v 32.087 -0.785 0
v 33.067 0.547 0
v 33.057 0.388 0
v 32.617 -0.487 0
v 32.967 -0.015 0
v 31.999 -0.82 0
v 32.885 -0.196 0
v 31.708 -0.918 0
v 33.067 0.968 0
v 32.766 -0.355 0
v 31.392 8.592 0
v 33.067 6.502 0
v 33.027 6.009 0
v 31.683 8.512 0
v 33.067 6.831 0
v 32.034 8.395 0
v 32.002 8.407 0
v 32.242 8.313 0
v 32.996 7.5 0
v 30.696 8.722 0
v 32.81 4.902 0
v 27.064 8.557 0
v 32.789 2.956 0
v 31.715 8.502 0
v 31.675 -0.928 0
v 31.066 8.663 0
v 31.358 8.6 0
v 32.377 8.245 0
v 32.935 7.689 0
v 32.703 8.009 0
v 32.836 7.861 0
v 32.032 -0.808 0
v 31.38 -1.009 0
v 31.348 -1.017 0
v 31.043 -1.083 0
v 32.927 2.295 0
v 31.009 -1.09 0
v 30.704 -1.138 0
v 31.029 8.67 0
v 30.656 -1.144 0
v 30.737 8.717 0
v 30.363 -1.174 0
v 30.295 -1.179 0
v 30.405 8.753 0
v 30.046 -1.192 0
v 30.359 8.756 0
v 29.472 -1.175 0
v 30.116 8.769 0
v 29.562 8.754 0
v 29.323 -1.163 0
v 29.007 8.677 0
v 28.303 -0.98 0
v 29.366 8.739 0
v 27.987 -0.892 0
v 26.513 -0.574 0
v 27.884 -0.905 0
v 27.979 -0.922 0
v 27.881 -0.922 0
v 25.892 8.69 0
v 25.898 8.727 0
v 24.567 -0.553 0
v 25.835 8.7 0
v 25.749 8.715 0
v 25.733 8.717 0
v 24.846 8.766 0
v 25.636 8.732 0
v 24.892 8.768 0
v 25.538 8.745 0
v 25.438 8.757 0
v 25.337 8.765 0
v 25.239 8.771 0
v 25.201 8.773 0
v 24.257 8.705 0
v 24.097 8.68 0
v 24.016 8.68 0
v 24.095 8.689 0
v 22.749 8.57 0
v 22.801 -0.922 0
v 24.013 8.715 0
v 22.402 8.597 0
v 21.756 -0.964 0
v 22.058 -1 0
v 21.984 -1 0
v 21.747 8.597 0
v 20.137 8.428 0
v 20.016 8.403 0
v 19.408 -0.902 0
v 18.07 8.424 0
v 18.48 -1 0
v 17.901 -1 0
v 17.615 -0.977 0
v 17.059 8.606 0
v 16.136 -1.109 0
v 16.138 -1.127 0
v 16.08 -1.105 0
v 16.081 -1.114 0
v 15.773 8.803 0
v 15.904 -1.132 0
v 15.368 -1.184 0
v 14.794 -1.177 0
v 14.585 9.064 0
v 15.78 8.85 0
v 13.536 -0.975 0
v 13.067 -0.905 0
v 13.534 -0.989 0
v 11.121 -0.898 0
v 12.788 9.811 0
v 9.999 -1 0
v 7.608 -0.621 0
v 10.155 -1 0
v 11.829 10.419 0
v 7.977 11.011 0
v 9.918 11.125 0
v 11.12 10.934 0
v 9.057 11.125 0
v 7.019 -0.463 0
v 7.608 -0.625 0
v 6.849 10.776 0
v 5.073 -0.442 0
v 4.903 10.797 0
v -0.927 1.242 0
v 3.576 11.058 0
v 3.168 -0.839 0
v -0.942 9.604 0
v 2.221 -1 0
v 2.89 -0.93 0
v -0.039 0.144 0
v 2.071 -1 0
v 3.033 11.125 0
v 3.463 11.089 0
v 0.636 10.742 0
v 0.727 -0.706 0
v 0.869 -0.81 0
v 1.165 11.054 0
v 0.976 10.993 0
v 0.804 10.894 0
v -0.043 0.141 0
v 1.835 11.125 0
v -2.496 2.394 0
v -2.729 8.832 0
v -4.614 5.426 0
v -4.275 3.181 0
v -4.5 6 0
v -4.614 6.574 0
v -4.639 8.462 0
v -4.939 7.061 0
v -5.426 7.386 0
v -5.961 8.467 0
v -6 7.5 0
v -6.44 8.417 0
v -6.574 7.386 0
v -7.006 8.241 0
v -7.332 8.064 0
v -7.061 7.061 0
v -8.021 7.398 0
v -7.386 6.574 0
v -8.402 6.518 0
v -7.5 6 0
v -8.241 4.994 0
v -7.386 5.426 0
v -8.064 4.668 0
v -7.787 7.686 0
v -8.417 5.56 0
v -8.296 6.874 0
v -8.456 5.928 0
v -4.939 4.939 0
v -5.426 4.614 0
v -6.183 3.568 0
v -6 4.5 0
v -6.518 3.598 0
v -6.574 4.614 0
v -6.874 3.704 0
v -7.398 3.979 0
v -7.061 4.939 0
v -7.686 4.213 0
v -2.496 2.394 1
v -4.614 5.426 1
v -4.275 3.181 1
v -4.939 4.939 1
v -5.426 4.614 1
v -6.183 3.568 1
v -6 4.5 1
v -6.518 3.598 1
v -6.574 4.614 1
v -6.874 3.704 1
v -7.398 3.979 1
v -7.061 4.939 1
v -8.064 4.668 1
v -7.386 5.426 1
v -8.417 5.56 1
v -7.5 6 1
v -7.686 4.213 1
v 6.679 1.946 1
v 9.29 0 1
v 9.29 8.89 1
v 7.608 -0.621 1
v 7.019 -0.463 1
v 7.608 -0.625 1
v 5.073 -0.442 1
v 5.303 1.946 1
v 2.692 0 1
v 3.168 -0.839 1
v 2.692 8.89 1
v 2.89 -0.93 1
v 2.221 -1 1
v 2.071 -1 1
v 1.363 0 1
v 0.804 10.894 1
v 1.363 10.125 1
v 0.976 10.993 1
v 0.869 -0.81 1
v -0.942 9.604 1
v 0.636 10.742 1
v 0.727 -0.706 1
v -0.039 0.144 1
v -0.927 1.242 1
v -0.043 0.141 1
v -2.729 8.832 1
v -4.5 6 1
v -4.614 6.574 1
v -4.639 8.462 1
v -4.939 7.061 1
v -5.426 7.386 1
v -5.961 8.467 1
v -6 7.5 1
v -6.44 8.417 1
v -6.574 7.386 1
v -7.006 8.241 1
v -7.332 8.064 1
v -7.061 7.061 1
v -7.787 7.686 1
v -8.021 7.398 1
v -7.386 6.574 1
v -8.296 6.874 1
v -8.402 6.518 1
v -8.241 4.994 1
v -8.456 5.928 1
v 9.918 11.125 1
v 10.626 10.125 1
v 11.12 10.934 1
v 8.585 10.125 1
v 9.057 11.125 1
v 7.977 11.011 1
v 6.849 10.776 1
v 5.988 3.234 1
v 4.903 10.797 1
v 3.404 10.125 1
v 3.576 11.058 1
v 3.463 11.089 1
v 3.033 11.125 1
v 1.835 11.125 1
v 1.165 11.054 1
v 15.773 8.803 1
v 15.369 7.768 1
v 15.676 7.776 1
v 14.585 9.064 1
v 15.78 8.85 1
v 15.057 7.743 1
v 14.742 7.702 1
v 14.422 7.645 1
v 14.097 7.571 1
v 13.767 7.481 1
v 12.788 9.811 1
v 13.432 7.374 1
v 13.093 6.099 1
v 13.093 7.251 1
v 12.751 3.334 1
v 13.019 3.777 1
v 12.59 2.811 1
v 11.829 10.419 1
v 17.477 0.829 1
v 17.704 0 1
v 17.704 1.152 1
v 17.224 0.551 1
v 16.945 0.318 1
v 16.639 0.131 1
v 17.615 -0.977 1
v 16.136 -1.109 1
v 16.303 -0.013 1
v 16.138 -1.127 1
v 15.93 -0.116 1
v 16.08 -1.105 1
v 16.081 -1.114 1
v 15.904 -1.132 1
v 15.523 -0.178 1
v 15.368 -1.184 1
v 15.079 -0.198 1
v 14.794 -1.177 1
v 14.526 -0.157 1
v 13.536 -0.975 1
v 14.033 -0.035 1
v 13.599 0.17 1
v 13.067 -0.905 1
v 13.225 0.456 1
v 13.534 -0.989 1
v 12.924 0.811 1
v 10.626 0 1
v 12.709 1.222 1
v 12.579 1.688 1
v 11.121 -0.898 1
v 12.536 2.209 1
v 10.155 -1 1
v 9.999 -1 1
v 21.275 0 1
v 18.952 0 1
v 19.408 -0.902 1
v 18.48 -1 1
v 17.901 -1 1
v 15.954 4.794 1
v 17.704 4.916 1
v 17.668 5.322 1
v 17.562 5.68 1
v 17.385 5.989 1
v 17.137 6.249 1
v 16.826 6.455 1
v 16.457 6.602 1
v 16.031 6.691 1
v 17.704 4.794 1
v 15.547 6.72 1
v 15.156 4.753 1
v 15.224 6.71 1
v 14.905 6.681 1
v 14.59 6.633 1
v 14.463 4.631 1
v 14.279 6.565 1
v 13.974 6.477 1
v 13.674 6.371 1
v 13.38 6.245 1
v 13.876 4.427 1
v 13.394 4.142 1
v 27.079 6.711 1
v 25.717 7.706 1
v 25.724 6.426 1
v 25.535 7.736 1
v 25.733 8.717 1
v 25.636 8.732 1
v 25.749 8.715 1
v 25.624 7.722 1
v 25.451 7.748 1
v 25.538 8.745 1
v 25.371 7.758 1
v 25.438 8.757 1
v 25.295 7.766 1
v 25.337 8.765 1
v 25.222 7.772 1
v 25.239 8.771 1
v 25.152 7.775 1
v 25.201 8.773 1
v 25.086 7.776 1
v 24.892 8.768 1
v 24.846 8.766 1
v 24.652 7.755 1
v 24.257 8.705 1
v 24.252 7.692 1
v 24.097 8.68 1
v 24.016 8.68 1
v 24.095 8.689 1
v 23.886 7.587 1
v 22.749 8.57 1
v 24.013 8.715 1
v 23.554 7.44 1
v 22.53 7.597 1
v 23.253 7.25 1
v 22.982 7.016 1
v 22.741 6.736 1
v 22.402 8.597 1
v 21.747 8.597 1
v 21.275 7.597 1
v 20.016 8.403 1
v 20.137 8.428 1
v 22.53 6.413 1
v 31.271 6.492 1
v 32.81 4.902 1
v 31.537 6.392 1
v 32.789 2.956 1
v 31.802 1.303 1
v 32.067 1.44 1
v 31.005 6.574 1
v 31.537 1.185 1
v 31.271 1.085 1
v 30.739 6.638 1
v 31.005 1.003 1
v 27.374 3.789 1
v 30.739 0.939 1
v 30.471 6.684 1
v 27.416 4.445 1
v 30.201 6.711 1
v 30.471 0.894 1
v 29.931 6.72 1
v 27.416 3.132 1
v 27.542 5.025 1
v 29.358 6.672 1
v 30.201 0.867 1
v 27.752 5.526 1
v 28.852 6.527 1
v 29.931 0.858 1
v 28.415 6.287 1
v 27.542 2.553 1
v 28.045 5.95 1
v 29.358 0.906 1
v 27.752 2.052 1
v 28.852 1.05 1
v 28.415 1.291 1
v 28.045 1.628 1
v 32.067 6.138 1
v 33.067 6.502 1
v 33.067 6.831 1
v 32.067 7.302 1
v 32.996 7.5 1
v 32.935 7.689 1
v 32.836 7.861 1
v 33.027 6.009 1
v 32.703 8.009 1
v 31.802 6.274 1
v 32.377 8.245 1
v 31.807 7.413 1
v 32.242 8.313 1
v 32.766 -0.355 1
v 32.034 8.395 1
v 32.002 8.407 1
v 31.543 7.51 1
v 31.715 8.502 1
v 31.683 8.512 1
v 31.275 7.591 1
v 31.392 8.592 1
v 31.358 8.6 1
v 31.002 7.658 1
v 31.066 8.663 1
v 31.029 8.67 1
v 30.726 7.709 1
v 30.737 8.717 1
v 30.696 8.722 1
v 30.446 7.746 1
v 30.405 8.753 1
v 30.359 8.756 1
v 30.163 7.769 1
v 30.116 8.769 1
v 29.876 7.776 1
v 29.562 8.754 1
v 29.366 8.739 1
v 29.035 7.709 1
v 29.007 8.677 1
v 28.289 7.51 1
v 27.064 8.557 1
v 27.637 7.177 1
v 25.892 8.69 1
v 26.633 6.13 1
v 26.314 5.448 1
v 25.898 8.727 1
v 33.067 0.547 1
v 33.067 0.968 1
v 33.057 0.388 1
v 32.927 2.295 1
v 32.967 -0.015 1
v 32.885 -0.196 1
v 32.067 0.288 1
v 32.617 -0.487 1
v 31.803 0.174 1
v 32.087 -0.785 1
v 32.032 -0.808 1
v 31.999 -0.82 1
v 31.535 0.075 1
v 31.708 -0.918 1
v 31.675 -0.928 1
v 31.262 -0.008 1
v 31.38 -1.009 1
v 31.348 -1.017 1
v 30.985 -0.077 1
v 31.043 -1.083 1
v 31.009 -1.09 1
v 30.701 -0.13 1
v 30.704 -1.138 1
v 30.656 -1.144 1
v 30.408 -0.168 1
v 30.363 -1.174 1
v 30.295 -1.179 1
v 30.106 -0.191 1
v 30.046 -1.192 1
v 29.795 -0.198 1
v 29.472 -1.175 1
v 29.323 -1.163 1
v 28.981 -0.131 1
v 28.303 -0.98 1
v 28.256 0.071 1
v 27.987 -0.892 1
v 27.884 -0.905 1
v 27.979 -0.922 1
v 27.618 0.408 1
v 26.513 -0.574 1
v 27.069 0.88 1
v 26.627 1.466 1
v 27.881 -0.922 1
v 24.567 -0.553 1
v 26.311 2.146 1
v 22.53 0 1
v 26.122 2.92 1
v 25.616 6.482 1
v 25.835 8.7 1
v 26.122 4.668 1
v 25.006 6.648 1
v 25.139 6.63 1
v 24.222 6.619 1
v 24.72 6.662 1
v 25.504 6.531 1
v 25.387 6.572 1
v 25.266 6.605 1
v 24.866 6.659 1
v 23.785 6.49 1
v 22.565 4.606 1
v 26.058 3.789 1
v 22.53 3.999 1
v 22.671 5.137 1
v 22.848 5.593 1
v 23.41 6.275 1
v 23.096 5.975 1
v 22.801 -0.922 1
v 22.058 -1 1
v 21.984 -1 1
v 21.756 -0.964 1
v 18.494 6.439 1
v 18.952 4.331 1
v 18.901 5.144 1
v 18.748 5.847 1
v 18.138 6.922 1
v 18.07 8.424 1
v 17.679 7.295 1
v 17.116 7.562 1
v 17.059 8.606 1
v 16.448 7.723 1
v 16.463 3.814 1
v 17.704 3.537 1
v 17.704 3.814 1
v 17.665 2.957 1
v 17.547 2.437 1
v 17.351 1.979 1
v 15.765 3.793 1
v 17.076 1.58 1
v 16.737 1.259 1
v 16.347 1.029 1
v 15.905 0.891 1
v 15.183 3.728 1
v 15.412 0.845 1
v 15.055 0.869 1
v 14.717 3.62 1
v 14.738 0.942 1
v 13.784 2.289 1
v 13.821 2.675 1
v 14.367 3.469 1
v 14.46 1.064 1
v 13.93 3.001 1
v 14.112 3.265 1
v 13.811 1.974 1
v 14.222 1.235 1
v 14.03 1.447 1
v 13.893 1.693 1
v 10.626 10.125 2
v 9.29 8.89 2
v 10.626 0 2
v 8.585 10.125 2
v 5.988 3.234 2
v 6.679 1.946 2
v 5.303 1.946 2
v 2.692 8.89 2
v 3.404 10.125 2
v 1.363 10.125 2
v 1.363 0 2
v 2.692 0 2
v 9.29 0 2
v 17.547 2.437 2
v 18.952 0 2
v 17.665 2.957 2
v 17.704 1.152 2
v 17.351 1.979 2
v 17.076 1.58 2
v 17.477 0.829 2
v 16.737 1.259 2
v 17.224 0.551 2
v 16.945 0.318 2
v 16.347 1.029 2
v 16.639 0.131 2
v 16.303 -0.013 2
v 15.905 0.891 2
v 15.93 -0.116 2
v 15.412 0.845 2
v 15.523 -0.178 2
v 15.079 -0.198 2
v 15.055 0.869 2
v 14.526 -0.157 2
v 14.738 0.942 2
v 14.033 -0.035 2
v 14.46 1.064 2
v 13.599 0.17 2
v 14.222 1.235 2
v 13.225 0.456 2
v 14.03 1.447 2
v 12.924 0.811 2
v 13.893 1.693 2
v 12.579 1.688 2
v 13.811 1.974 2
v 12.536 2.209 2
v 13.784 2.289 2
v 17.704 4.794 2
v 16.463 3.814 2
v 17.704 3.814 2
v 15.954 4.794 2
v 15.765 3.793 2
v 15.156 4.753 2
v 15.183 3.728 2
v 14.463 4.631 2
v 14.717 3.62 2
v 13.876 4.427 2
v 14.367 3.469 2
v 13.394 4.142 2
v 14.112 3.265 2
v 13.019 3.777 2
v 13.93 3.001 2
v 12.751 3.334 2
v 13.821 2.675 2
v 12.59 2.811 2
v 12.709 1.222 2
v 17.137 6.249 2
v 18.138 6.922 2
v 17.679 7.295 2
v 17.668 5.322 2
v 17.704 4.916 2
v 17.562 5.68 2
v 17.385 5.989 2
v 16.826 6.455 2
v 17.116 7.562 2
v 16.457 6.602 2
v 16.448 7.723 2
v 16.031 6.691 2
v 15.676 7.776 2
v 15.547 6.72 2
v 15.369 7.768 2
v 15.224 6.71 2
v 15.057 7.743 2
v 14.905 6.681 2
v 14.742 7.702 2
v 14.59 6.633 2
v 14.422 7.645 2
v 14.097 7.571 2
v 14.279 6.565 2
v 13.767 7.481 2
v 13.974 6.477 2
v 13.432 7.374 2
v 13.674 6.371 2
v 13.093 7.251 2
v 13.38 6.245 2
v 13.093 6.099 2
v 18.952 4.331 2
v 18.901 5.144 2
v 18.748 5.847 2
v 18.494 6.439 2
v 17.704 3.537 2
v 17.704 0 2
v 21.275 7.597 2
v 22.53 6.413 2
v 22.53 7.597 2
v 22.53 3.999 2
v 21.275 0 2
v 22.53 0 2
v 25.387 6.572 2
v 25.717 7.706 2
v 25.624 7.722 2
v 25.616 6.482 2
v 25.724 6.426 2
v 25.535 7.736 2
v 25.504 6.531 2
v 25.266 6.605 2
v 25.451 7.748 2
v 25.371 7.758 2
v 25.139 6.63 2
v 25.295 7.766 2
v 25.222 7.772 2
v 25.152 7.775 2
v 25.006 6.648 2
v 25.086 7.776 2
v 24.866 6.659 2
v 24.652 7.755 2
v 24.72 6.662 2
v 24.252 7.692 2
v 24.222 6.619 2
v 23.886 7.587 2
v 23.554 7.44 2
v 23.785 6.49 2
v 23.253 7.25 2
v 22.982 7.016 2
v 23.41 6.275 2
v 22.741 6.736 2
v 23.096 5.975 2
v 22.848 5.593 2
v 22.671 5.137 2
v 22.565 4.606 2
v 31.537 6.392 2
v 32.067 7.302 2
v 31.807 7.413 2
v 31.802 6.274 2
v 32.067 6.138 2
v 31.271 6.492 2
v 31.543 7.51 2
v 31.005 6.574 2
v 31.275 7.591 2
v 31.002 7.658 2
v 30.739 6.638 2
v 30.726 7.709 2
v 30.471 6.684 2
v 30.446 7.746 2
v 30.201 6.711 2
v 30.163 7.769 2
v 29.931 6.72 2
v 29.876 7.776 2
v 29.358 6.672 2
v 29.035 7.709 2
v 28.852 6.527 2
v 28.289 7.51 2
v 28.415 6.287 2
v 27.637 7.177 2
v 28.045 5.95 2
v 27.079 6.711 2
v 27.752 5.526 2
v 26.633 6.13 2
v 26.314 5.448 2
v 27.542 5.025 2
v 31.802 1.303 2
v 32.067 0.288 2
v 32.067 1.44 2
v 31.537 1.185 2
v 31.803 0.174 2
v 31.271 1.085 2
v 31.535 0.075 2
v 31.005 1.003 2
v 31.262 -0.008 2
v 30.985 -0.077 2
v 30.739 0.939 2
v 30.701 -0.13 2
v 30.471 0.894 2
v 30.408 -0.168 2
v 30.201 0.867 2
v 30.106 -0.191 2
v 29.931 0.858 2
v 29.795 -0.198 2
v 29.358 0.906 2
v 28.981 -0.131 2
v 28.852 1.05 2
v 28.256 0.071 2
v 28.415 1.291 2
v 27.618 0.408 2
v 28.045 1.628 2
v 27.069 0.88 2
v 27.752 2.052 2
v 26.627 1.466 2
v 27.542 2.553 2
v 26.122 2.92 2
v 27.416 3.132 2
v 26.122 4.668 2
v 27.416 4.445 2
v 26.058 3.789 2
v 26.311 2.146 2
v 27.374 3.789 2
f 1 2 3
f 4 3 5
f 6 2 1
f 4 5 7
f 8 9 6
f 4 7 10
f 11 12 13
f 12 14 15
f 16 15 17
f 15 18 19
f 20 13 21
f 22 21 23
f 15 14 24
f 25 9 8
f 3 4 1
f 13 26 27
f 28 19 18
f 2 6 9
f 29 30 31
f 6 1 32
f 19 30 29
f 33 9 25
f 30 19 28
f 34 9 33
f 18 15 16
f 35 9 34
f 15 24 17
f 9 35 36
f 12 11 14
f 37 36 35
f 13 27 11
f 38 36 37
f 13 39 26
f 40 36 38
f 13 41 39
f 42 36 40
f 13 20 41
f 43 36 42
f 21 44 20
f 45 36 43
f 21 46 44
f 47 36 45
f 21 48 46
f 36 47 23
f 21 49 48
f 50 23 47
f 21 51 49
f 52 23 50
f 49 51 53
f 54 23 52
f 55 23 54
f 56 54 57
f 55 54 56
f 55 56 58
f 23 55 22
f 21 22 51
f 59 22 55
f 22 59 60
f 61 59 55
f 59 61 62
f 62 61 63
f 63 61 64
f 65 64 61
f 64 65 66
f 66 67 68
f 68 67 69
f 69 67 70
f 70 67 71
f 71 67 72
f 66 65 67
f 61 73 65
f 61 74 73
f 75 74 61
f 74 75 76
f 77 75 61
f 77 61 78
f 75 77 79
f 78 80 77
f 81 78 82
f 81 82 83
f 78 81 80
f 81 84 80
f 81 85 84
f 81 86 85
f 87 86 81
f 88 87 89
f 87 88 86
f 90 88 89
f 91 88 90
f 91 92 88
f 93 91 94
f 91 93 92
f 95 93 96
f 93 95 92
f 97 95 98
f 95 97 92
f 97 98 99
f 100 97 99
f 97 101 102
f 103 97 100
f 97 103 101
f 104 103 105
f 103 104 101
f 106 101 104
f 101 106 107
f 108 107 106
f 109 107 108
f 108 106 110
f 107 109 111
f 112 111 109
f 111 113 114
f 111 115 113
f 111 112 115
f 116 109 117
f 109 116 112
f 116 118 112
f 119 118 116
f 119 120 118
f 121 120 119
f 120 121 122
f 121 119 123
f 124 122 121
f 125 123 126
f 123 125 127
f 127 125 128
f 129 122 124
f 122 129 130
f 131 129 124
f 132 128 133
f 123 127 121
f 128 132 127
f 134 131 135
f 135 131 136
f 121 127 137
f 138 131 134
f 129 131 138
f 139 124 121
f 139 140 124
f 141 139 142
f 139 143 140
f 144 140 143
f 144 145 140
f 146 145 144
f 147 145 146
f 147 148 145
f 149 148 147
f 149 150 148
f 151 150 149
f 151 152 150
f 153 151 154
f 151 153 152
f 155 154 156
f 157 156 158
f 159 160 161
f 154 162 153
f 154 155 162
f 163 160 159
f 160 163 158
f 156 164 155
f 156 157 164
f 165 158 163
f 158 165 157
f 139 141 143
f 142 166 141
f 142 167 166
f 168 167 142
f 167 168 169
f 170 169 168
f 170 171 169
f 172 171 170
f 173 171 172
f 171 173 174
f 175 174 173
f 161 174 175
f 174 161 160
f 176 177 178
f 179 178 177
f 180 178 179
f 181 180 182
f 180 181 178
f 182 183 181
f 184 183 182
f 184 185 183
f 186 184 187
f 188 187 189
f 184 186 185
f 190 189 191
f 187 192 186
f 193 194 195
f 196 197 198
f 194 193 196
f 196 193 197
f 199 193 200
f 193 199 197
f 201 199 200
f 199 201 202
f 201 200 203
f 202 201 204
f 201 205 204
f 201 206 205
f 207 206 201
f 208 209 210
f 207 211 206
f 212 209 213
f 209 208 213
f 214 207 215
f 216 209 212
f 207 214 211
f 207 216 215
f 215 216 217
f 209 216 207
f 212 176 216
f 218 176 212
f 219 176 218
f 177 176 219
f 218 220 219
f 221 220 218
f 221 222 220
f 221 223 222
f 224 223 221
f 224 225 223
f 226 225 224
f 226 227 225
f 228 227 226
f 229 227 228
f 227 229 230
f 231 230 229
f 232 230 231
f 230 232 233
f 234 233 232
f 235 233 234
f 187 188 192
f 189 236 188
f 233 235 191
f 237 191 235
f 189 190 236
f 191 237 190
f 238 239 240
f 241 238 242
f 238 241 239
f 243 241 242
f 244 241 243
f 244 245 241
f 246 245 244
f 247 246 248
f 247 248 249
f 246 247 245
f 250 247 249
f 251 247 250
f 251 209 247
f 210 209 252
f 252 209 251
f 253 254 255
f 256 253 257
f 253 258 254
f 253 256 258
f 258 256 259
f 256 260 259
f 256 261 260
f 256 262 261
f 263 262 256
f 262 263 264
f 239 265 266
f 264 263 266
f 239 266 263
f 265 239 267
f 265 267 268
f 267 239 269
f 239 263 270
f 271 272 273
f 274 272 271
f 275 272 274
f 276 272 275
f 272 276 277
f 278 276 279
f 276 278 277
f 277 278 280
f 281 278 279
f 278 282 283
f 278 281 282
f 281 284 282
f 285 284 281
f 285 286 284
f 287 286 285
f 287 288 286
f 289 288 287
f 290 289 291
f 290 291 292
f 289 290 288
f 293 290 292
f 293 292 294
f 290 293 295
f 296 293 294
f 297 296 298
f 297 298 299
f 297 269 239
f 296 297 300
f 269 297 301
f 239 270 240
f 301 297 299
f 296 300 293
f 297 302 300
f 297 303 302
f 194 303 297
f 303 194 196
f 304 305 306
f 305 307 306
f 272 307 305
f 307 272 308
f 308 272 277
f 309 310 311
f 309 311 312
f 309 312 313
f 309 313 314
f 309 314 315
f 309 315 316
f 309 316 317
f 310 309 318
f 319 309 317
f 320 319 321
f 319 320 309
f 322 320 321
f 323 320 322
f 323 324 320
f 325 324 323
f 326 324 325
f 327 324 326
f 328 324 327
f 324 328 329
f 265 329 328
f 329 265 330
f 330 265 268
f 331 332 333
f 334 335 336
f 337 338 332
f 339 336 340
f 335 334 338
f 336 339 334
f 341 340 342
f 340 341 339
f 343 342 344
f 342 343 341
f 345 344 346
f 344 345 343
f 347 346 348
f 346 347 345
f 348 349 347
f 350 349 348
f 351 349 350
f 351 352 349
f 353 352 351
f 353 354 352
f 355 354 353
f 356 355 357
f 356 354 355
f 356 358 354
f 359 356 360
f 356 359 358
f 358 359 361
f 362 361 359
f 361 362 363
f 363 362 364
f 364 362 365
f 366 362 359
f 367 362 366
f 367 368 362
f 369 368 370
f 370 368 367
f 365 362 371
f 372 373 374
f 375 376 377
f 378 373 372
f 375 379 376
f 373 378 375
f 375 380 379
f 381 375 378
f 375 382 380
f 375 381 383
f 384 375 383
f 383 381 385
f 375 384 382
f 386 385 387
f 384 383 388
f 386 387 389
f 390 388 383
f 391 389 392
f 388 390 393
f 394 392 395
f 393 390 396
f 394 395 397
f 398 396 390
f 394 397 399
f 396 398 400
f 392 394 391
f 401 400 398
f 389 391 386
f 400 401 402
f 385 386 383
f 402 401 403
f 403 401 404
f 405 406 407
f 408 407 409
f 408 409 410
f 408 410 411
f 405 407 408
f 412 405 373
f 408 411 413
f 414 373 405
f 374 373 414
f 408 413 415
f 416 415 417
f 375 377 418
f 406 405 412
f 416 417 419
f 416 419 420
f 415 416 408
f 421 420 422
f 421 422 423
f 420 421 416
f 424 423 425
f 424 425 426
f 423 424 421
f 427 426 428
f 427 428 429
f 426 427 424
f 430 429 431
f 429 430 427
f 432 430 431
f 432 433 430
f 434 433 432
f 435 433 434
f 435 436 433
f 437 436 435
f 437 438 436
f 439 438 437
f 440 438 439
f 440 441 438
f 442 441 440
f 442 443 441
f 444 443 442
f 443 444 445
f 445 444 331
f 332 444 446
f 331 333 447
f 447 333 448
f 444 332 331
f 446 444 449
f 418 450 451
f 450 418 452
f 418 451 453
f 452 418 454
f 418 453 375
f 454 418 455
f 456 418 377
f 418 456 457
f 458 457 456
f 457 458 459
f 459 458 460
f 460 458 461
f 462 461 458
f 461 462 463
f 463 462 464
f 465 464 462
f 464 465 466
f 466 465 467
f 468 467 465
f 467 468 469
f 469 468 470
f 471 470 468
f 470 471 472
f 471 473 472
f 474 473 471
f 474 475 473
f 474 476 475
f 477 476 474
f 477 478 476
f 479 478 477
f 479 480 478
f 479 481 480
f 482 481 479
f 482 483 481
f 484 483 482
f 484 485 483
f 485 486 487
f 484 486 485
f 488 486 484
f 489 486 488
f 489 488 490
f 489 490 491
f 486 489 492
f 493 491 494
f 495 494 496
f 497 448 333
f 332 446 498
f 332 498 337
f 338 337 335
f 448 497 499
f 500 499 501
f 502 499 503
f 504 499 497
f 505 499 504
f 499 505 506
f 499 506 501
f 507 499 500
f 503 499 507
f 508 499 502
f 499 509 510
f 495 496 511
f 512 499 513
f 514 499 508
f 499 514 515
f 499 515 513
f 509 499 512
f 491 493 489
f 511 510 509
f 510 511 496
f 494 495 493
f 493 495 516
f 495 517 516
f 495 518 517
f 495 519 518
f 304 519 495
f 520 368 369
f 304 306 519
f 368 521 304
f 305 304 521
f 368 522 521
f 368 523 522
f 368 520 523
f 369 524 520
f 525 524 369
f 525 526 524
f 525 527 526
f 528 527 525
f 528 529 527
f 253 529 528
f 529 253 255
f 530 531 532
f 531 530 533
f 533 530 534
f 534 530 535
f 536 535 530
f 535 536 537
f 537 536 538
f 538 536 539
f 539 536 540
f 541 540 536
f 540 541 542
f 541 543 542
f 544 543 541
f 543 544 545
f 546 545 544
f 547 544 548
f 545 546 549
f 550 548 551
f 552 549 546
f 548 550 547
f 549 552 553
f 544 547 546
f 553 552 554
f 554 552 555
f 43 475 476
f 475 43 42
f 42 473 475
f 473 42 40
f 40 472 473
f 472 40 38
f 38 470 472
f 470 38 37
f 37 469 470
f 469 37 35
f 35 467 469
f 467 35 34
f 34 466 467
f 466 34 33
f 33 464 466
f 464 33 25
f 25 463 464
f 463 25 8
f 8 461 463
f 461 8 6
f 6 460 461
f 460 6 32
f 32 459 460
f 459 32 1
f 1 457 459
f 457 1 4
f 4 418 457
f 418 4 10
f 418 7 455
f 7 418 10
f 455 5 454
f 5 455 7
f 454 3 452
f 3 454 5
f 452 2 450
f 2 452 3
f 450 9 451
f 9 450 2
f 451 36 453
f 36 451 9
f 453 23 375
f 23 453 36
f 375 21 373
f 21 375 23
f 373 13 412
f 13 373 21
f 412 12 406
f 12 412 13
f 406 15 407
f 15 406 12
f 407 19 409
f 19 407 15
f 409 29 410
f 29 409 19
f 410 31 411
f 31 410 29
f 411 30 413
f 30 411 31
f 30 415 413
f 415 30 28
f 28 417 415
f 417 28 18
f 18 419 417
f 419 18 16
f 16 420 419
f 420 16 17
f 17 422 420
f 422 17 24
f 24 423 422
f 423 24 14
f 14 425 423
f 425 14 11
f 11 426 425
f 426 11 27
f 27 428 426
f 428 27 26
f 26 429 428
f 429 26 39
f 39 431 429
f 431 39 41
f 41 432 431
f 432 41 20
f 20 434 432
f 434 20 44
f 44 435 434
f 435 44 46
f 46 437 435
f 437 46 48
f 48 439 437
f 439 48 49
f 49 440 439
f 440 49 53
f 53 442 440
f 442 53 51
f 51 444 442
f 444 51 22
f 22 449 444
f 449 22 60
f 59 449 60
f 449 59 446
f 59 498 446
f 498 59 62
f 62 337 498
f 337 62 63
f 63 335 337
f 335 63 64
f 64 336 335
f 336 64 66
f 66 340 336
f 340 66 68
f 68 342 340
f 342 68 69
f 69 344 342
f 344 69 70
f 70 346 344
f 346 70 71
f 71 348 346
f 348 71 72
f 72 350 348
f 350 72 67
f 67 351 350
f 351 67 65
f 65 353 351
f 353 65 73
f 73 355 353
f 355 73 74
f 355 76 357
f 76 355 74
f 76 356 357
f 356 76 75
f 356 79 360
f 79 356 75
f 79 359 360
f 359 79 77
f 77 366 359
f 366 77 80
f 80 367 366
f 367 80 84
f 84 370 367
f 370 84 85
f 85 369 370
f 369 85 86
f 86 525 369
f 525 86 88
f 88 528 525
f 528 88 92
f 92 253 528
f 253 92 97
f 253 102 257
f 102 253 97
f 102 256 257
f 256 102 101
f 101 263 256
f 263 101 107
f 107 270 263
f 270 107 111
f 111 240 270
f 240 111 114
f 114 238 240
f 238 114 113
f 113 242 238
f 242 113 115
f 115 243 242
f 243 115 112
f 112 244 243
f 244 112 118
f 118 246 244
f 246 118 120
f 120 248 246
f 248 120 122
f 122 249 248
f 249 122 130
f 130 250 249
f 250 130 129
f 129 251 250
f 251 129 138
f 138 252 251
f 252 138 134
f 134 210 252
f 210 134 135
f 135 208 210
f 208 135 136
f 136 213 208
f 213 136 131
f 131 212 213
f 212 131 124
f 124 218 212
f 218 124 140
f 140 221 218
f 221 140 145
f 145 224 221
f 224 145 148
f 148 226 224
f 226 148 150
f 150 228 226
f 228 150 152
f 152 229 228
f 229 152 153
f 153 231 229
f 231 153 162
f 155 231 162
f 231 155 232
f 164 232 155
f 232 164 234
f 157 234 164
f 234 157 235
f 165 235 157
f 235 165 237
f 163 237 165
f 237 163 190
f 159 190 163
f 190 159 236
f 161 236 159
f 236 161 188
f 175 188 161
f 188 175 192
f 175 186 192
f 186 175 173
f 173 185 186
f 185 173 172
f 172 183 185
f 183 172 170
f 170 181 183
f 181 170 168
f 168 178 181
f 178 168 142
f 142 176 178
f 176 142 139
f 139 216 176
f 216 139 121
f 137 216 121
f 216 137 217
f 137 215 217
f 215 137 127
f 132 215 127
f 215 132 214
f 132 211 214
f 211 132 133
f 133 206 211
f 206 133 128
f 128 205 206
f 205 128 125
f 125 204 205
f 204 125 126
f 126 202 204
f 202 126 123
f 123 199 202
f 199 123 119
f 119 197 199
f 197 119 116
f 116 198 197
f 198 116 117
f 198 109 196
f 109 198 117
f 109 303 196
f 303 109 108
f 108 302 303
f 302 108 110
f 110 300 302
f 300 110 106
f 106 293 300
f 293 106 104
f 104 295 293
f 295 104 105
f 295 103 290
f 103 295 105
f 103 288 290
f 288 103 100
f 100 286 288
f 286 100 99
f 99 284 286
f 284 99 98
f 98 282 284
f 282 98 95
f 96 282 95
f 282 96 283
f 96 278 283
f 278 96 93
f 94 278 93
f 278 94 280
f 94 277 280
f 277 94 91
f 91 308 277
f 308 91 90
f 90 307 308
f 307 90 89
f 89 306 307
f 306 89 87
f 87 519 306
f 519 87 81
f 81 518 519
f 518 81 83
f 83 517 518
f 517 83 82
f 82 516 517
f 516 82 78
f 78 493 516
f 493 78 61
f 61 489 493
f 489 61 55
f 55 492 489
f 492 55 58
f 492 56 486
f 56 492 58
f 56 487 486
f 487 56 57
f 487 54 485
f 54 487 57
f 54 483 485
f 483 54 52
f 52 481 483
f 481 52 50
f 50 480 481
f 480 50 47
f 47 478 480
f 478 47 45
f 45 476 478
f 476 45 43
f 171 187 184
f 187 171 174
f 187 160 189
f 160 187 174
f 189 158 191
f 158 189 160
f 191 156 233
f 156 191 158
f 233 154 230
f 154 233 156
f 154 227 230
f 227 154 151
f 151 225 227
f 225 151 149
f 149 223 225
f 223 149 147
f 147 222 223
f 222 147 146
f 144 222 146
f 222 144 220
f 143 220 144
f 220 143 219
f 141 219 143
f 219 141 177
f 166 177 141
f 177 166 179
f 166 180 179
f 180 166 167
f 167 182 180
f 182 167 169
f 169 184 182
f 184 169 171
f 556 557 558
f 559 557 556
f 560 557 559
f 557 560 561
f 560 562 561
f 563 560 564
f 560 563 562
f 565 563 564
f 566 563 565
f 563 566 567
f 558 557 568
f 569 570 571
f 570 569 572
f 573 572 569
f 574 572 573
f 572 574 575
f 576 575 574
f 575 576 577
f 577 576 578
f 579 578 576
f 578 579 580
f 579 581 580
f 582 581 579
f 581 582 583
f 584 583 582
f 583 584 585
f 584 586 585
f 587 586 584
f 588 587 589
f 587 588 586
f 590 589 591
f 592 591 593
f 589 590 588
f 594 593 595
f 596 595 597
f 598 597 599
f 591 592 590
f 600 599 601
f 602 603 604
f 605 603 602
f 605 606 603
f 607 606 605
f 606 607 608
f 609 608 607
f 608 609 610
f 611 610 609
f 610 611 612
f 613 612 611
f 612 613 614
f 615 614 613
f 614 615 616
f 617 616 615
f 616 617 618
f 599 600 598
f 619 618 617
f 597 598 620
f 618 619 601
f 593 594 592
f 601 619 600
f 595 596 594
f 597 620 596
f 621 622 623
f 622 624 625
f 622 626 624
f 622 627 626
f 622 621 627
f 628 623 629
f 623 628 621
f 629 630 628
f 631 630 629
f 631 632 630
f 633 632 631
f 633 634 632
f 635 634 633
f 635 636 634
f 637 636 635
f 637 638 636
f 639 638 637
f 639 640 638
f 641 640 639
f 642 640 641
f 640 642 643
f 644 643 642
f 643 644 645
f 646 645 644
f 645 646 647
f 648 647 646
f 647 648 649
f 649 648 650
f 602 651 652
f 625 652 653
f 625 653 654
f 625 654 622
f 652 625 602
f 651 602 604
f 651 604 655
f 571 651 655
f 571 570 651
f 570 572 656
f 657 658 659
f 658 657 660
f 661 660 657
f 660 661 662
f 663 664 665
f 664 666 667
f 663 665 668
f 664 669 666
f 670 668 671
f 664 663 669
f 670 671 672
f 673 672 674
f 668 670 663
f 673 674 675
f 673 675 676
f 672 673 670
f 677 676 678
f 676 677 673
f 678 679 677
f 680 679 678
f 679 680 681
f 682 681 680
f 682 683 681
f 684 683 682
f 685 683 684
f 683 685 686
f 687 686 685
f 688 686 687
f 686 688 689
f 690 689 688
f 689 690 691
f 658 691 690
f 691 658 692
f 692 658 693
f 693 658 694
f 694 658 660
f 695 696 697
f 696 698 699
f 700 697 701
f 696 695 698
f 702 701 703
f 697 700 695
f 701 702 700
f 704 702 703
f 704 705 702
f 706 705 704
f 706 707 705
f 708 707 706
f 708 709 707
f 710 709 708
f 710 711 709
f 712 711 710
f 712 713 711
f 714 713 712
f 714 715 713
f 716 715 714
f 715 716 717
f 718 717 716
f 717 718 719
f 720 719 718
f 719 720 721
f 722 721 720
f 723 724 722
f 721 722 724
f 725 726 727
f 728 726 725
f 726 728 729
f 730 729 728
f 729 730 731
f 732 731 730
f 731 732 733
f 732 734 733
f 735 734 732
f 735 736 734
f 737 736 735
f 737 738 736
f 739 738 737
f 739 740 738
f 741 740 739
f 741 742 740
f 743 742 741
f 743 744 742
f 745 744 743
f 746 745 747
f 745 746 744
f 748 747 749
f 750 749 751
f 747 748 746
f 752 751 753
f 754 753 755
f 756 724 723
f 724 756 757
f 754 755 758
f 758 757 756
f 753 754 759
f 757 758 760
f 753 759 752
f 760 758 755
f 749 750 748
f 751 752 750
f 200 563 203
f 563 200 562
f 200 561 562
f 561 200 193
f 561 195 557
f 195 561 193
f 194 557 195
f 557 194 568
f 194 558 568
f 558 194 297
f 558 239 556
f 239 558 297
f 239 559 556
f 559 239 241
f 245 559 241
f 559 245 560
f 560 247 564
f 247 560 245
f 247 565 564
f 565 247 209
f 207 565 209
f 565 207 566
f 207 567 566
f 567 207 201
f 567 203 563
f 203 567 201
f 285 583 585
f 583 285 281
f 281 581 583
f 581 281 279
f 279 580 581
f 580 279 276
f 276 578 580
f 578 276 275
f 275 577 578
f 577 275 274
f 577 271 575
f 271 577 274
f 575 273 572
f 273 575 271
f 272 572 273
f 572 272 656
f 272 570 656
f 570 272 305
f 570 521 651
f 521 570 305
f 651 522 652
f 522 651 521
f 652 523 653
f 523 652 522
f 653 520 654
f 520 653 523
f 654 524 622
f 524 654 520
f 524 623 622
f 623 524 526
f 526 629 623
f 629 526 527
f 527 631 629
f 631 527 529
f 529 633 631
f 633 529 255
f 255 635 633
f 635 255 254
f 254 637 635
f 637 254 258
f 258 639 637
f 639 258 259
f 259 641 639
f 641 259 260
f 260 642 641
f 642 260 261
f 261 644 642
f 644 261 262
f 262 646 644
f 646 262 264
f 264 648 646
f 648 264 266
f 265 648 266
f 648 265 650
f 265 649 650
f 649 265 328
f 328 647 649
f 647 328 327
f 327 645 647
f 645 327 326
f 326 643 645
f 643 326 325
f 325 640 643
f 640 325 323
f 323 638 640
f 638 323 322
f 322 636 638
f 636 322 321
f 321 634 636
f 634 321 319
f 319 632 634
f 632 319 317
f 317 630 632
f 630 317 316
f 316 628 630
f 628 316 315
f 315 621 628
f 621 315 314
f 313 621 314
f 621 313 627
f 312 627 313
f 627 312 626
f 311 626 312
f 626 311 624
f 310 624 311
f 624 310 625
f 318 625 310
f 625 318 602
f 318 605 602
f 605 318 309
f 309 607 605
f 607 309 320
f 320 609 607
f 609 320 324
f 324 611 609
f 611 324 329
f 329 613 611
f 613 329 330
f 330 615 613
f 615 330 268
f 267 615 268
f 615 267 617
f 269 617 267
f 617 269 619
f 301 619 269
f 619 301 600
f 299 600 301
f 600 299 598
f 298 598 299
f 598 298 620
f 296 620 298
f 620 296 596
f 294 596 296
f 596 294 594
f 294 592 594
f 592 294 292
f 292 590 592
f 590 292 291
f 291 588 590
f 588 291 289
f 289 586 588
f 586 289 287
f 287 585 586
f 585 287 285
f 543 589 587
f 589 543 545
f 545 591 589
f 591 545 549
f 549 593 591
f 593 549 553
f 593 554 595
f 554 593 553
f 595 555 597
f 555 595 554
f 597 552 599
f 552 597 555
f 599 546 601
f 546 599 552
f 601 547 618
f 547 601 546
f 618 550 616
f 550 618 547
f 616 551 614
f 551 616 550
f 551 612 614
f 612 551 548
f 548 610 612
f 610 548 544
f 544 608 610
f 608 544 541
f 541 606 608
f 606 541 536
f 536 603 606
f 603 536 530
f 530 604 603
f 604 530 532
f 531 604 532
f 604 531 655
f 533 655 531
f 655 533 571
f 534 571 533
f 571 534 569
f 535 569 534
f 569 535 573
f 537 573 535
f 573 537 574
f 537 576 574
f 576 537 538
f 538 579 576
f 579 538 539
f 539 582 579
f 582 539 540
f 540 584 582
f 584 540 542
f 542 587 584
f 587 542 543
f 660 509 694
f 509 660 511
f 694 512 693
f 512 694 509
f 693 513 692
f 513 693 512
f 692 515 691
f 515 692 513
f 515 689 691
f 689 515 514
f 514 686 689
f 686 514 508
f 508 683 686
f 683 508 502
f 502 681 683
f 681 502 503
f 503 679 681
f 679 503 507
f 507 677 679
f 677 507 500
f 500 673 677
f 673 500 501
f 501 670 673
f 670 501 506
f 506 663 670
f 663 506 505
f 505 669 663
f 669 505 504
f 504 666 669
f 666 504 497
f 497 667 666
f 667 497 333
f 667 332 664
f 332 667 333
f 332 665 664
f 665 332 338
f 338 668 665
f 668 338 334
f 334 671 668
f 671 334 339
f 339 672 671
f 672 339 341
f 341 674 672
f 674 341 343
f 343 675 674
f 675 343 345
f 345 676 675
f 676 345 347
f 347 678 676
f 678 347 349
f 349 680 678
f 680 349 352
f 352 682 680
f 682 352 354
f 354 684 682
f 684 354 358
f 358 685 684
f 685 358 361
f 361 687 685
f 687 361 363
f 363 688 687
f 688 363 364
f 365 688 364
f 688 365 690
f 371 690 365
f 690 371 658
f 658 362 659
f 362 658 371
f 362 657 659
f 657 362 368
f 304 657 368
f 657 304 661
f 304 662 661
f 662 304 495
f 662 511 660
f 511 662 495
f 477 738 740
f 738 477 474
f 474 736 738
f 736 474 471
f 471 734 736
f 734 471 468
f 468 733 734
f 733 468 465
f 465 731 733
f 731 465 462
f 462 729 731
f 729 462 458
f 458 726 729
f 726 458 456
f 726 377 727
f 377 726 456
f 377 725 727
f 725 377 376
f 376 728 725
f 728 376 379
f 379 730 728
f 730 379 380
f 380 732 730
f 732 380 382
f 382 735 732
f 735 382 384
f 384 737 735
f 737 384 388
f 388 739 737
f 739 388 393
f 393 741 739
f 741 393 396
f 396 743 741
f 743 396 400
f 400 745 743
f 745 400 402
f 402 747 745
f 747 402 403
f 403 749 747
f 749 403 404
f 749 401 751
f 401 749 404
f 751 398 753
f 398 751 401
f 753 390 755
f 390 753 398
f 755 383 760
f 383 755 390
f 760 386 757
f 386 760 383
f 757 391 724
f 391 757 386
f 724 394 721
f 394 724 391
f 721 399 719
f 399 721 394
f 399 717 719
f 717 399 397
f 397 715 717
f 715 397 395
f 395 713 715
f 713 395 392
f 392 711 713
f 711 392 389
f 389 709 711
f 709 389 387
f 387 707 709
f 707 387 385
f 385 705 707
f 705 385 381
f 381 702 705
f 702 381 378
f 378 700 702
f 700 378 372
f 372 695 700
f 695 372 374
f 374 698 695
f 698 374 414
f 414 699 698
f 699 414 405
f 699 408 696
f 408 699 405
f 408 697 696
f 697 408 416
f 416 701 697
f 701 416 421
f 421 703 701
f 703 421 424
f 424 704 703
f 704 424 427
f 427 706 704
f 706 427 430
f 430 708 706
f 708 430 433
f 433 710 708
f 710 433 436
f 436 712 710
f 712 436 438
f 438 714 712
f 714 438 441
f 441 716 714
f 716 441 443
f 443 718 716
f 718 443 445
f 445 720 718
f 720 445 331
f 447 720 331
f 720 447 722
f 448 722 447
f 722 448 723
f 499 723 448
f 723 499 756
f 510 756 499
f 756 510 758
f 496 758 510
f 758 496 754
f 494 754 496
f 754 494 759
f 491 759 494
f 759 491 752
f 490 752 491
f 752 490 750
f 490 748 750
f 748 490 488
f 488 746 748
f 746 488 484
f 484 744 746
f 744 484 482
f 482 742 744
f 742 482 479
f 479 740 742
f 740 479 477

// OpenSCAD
/*

Générateur de porte-clefs

*/
mot="Marc";
police="Orbitron";////[Abril Fatface,Aclonica,Acme,Advent Pro,Akronim,Aladin,Alegreya,Alegreya Sans,Alegreya SC,Alex Brush,Alfa Slab One,Alice,Amaranth,Architects Daughter,Archivo Black,Archivo Narrow,Arimo,Arvo,Asap,Astloch,Asul,Averia Libre,Averia Serif Libre,Bangers,Basic,Belgrano,Berkshire Swash,Bigshot One,Bilbo Swash Caps,Black Ops One,Bonbon,Bowlby One SC,Brawler,Bubblegum Sans,Butterfly Kids,Cabin Condensed,Caesar Dressing,Cagliostro,Calligraffitti,Capriola,Carter One,Changa One,Chango,Chelsea Market,Cherry Cream Soda,Chewy,Chicle,Chivo,Clicker Script,Coming Soon,Concert One,Condiment,Cookie,Courgette,Covered By Your Grace,Crimson Text,Dancing Script,DejaVu Sans,DejaVu Serif,Dhurjati,Doppio One,Dosis,Droid Sans,Eagle Lake,Electrolize,Emilys Candy,Encode Sans,Encode Sans Compressed,Euphoria Script,Exo,Exo 2,Faster One,Federo,Finger Paint,Fjord One,Fontdiner Swanky,Freckle Face,Fruktur,Gabriela,Geo,Germania One,Give You Glory,Gloria Hallelujah,Goudy Bookletter 1911,Graduate,Grand Hotel,Great Vibes,Griffy,Hanalei Fill,Happy Monkey,Henny Penny,Hind,IM Fell English SC,Indie Flower,Irish Grover,Italianno,Jacques Francois Shadow,Jolly Lodger,Josefin Slab,Joti One,Judson,Just Another Hand,Kalam,Kameron,Karma,Kavoon,Knewave,Kranky,Kristi,Laila,Lakki Reddy,Lancelot,Lato,Leckerli One,Ledger,Lekton,Lemon One,Liberation Sans,Libre Caslon Text,Life Savers,Lilita One,Lily Script One,Limelight,Lobster,Lobster Two,Londrina Outline,Londrina Shadow,Londrina Solid,Lora,Love Ya Like A Sister,Loved by the King,Lovers Quarrel,Luckiest Guy,Lusitana,Macondo,Macondo Swash Caps,Mako,Marck Script,Margarine,Marko One,Maven Pro,McLaren,MedievalSharp,Merienda One,Merriweather,Mervale Script,Metal Mania,Metrophobic,Milonga,Miltonian Tattoo,Miss Fajardose,Molle,Montez,Montserrat,Mr De Haviland,Mystery Quest,Neucha,New Rocker,Niconne,Nosifer,Nothing You Could Do,Noto Sans Oriya,Noto Serif,Nova Square,Nunito,Old Standard TT,Oleo Script,Oleo Script Swash Caps,Orbitron,Oregano,Orienta,Original Surfer,Oswald,Over the Rainbow,Overlock,Oxygen,Pacifico,Paprika,Parisienne,Patrick Hand SC,Paytone One,Peralta,Permanent Marker,Piedra,Pirata One,Play,Playball,Poetsen One,Poppins,Press Start 2P,Princess Sofia,PT Mono,Qwigley,Racing Sans One,Raleway,Rancho,Ranga,Ribeye,Roboto,Roboto Condensed,Roboto Slab,Rochester,Rock Salt,Rubik One,Sail,Salsa,Sansita One,Sarina,Satisfy,Schoolbell,Seaweed Script,Sevillana,Shadows Into Light,Shadows Into Light Two,Share,Six Caps,Skranji,Source Sans Pro,Spicy Rice,Stardos Stencil,Stoke,Syncopate,Teko,Terminal Dosis,The Girl Next Door,Tillana,Timmana,Titillium Web,Ubuntu,Ultra,Underdog,UnifrakturCook,UnifrakturMaguntia,Vampiro One,Vidaloka,Viga,Voces,Volkhov,Vollkorn,Voltaire,Waiting for the Sunrise,Wallpoet,Wellfleet,Wendy One,Yellowtail,Yesteryear,Zeyada,perso]
Police_perso="Symbola";
enveloppe=100;//[0:200]
rebord=10;//[0:100]
Epaisseur=10;//[1:100]

union()
{
    linear_extrude((Epaisseur/10))
    {
        difference()
        {
            offset(-(enveloppe/10)+(rebord/10))
            offset((enveloppe/10))
            {
                translate([-6,6,0])
                circle(d=3,$fn=16);
                if(police=="perso")
                {
                    text(mot,font=Police_perso);
                }
                else
                {
                    text(mot,font=police);
                }
            }
            translate([-6,6,0])
            circle(d=3,$fn=16);
        }
    }
    linear_extrude((Epaisseur/10)*2)
    {
                if(police=="perso")
                {
                    text(mot,font=Police_perso);
                }
                else
                {
                    text(mot,font=police);
                }
    }
}
